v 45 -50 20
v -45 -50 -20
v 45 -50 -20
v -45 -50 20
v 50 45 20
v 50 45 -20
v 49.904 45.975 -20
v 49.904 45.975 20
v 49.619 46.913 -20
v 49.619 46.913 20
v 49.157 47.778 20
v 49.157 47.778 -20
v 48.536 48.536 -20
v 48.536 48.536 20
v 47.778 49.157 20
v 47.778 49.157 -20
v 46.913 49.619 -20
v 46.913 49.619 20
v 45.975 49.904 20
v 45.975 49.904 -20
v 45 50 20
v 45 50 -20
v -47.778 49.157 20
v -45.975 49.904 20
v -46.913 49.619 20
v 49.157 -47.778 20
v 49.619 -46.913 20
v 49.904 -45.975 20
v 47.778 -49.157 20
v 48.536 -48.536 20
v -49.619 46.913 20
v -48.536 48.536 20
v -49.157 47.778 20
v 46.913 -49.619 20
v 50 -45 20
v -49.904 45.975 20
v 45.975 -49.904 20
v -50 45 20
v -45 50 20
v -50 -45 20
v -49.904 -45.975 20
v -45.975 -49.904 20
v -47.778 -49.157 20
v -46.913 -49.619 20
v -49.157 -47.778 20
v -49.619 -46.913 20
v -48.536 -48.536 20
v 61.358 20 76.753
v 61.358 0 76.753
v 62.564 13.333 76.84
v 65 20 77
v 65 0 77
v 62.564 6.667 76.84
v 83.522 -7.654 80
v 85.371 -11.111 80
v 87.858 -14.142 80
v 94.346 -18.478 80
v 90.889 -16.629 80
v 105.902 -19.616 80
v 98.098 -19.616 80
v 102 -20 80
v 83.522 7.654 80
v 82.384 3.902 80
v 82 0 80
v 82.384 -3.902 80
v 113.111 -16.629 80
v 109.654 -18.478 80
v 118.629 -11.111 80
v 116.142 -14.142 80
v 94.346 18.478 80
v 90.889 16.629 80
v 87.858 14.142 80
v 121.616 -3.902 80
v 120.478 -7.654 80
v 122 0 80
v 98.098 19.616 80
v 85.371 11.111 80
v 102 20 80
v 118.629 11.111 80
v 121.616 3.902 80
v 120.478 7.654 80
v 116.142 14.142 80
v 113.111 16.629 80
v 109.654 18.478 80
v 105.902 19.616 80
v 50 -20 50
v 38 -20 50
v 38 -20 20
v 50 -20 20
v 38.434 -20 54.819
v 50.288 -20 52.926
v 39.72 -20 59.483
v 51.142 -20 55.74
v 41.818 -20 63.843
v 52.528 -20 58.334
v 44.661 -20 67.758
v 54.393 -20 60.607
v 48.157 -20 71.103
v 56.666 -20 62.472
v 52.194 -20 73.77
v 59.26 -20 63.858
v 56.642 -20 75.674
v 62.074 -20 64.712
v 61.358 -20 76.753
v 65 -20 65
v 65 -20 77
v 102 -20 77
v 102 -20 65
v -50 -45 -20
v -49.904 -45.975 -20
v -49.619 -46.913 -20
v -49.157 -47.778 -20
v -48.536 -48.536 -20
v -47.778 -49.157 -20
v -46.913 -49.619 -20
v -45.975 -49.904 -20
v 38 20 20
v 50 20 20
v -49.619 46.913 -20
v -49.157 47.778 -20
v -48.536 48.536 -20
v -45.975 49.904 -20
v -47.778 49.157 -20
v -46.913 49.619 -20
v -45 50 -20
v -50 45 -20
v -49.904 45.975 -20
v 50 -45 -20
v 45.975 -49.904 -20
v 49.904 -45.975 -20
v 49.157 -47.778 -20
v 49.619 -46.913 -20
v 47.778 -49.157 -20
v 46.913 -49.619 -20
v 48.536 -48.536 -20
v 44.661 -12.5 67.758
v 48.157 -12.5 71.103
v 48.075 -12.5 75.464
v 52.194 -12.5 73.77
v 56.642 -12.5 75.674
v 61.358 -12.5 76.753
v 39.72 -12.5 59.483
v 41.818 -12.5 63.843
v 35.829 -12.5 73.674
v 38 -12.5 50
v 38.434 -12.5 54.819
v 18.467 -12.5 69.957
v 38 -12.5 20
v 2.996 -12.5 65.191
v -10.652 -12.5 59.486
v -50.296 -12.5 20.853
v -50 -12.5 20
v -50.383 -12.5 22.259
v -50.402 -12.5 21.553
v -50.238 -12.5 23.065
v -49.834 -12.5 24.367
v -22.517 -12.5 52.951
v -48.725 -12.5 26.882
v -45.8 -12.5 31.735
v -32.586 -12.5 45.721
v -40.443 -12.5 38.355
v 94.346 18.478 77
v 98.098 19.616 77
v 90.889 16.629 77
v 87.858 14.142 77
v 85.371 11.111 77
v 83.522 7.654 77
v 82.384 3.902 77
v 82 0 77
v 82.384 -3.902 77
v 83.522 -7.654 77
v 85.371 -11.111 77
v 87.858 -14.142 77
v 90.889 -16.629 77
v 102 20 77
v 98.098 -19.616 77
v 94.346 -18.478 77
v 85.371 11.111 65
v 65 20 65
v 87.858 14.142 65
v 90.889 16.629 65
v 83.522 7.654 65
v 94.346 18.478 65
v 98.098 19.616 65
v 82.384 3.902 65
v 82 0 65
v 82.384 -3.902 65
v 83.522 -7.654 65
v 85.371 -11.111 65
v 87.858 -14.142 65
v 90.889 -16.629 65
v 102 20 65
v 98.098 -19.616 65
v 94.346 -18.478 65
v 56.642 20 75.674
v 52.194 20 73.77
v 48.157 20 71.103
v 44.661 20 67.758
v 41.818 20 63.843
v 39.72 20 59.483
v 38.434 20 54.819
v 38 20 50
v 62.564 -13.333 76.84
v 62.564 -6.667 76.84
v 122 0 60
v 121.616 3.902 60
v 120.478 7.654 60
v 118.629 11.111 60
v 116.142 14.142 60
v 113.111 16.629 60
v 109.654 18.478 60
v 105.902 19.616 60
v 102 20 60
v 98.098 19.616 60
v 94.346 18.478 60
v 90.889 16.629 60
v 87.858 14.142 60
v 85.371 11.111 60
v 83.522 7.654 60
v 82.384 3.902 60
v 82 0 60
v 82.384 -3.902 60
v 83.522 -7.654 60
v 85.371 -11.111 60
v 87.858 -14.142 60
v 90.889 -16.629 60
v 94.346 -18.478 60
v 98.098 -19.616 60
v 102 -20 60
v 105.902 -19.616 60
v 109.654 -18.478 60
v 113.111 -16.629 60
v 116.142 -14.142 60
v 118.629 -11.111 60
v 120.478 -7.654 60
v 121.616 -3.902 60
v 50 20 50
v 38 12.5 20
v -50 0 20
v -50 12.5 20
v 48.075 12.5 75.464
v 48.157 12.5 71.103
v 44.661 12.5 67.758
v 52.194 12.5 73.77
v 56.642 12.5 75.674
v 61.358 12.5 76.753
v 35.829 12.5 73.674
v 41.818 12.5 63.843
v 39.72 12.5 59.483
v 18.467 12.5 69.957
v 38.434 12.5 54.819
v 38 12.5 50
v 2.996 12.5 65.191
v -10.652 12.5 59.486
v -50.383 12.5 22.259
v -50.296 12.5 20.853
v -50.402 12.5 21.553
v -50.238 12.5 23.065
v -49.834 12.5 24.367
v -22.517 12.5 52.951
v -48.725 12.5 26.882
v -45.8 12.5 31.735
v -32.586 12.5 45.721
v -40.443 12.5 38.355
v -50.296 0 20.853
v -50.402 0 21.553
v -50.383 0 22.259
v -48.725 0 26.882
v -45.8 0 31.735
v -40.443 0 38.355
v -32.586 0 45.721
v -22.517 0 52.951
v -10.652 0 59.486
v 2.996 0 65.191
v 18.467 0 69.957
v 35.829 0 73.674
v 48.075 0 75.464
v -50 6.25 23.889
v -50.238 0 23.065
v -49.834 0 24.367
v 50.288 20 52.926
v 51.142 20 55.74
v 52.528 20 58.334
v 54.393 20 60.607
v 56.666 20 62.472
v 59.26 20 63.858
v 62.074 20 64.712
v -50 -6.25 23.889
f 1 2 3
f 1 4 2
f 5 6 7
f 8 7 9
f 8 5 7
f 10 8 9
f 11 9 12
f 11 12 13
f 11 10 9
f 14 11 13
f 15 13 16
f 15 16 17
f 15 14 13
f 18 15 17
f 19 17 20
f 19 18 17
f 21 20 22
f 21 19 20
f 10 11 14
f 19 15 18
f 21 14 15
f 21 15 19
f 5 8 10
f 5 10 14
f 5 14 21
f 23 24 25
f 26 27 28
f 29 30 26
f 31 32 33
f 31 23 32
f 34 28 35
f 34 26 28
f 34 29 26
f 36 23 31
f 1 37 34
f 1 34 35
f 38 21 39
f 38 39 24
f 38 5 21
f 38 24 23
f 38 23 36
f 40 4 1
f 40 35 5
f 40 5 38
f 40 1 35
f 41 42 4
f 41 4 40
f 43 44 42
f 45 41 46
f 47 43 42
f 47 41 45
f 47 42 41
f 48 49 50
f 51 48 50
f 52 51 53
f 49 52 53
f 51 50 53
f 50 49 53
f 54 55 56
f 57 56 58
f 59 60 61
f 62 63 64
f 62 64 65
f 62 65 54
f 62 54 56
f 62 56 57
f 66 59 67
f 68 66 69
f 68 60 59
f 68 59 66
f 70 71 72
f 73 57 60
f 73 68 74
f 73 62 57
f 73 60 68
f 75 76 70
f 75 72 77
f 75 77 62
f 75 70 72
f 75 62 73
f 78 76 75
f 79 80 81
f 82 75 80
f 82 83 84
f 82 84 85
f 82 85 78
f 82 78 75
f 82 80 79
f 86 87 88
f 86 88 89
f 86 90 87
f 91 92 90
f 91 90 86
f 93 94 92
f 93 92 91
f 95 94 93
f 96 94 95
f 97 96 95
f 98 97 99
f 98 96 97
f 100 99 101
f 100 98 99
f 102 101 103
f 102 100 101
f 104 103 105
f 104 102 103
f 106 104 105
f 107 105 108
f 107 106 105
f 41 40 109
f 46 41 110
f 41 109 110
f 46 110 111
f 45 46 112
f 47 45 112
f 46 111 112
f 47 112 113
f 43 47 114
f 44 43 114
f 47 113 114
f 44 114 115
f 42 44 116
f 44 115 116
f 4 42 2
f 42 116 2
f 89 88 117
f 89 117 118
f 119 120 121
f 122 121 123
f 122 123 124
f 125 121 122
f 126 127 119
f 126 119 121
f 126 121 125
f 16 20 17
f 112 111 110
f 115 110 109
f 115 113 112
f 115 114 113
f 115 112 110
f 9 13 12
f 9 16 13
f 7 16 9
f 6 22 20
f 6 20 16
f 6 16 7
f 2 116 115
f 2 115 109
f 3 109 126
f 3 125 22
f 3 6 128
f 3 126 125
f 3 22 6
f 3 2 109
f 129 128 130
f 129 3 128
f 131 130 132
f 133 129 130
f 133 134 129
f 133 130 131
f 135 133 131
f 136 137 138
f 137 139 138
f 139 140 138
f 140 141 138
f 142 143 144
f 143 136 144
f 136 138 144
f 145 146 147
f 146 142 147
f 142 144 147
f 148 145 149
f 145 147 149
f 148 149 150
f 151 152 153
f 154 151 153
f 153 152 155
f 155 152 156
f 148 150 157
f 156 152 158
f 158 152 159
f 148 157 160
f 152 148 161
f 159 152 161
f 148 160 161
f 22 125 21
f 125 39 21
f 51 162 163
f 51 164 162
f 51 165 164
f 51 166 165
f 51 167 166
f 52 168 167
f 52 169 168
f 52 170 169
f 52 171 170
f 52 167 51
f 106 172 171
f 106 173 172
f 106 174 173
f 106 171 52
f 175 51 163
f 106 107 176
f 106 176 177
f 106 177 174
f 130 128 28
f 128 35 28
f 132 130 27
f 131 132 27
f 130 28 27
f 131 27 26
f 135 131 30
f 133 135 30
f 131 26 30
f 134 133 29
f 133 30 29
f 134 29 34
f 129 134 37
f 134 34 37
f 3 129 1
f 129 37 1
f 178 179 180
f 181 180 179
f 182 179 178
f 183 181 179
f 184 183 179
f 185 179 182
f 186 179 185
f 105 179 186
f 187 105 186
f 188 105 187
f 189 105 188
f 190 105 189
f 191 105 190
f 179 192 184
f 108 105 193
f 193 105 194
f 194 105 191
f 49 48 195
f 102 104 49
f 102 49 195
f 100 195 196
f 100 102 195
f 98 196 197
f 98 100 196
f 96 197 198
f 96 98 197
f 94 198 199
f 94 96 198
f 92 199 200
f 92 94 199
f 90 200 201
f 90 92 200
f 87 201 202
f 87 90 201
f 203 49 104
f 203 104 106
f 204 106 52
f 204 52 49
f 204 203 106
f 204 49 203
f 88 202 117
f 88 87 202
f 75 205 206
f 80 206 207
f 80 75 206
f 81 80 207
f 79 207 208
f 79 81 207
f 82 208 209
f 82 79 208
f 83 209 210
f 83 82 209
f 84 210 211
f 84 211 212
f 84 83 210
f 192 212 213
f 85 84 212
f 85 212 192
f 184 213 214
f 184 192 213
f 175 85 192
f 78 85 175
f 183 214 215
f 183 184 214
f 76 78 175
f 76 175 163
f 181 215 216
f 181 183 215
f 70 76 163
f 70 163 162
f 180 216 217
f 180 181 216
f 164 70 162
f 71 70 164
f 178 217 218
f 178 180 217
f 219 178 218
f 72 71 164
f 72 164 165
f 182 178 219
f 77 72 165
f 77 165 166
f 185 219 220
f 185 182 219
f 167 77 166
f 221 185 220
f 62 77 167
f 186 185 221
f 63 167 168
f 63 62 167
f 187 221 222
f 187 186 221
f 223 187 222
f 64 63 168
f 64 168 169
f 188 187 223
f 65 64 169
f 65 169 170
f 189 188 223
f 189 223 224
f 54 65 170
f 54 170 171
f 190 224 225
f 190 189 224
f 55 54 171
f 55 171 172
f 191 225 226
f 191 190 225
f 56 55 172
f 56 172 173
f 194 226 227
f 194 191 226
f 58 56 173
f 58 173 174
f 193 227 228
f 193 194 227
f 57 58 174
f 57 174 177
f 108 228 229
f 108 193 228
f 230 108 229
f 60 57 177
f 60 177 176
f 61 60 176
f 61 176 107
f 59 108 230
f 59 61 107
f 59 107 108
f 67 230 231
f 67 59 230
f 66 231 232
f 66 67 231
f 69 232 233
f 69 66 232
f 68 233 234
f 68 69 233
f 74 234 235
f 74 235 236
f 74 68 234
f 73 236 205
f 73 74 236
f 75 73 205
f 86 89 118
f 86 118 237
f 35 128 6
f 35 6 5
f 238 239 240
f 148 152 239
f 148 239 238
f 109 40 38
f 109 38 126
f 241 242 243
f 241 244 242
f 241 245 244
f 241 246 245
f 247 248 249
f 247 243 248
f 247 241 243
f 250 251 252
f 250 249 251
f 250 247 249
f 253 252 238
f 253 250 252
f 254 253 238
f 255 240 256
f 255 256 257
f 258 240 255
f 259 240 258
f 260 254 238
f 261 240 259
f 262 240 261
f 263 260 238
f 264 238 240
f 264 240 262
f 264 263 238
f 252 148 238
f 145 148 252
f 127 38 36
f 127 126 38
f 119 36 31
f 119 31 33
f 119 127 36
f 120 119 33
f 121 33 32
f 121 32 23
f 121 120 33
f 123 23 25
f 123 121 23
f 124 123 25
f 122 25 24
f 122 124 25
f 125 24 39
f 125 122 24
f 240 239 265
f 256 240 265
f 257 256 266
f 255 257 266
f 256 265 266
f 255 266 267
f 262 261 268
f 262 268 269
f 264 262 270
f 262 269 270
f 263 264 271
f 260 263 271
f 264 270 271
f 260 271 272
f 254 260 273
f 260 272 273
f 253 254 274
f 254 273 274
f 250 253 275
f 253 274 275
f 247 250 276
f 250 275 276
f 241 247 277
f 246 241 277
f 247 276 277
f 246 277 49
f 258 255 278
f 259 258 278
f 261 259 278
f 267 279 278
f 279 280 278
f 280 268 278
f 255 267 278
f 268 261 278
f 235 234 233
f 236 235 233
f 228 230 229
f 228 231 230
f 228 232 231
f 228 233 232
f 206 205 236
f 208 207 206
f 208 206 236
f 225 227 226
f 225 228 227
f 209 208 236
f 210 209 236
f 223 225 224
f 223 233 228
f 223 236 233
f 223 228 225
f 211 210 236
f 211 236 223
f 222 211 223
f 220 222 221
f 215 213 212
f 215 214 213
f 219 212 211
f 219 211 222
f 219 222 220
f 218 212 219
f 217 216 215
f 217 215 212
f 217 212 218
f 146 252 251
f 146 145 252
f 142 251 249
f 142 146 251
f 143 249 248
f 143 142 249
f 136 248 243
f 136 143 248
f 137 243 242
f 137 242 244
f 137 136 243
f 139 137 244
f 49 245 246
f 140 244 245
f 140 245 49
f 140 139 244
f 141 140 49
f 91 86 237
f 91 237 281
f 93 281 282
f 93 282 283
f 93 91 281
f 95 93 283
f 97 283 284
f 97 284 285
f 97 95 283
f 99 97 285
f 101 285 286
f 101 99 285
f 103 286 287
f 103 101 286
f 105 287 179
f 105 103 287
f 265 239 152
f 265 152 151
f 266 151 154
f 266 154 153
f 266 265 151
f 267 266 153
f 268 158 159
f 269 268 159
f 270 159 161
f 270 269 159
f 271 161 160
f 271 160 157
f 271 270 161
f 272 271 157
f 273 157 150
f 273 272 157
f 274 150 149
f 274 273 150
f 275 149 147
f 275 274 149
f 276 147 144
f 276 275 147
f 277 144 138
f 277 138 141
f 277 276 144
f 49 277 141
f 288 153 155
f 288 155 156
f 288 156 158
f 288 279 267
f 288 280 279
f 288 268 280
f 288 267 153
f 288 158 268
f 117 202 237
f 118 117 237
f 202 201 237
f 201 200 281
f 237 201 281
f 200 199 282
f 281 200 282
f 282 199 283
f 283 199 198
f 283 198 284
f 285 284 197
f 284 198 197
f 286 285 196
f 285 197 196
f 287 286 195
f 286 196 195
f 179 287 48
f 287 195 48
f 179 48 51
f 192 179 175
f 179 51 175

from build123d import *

# Parameters (mm, degrees)
F1_DEPTH = 50
F0_W     = 20
F0_H     = 12
F2_DEPTH = 20
F3_DEPTH = 12.5
F5_R     = 5


with BuildPart() as f1:
    # F0 (on Front) → F1 (new body, symmetric)
    with BuildSketch(Plane.XZ):
        Polygon((38, 20), (-50, 20), (-50, -20), (50, -20), (50, 20), align=None)
    extrude(amount=F1_DEPTH, both=True)

    # F5
    f5_edges = [f1.edges().sort_by_distance(p)[0] for p in [
        (-50, -50, 0),
        (50, -50, 0),
        (50, 50, 0),
        (-50, 50, 0),
    ]]
    fillet(f5_edges, radius=F5_R)


with BuildPart() as f2:
    # F0 (on Front) → F2 (new body, symmetric)
    with BuildSketch(Plane.XZ):
        with BuildLine():
            Line((38, 50), (38, 20))
            Line((38, 20), (50, 20))
            Line((50, 20), (50, 50))
            ThreePointArc((50, 50), (54.3933982822, 60.6066017178), (65, 65))
            Line((65, 65), (82, 65))
            Line((82, 65), (82, 77))
            Line((82, 77), (65, 77))
            add(Edge.make_bspline(
                [(61.3580444875, 76.7532457852), (62.5597999465, 76.8419007216), (63.7737478912, 76.9242092429), (65, 77)],
                knots=[0.9879056344, 0.9879056344, 0.9879056344, 0.9879056344, 1, 1, 1, 1], degree=3))
            ThreePointArc((61.3580444875, 76.7532457852), (44.6612094898, 67.757634994), (38, 50))
        make_face()
        with Locations((92, 71)):
            Rectangle(F0_W, F0_H)
    extrude(amount=F2_DEPTH, both=True)

    # F0 (on Front) → F4 (revolve)
    with BuildSketch(Plane.XZ):
        Polygon((102, 80), (102, 77), (102, 65), (102, 60), (122, 60), (122, 80), align=None)
    revolve(axis=Axis((102, 0, 70), (0, 0, 1)))


with BuildPart() as f3:
    # F0 (on Front) → F3 (new body, symmetric)
    with BuildSketch(Plane.XZ):
        with BuildLine():
            add(Edge.make_bspline(
                [(-50, 20), (-50.5007385187, 21.1618028945), (-51.0808425585, 27.4095380202), (-21.9899896666, 70.6045617), (61.3580444875, 76.7532457852)],
                knots=[0, 0, 0, 0, 0.1490980504, 0.9879056344, 0.9879056344, 0.9879056344, 0.9879056344], degree=3))
            Line((-50, 20), (38, 20))
            Line((38, 20), (38, 50))
            ThreePointArc((38, 50), (44.6612094898, 67.757634994), (61.3580444875, 76.7532457852))
        make_face()
    extrude(amount=F3_DEPTH, both=True)


solid = Compound([f1.part, f2.part, f3.part])
